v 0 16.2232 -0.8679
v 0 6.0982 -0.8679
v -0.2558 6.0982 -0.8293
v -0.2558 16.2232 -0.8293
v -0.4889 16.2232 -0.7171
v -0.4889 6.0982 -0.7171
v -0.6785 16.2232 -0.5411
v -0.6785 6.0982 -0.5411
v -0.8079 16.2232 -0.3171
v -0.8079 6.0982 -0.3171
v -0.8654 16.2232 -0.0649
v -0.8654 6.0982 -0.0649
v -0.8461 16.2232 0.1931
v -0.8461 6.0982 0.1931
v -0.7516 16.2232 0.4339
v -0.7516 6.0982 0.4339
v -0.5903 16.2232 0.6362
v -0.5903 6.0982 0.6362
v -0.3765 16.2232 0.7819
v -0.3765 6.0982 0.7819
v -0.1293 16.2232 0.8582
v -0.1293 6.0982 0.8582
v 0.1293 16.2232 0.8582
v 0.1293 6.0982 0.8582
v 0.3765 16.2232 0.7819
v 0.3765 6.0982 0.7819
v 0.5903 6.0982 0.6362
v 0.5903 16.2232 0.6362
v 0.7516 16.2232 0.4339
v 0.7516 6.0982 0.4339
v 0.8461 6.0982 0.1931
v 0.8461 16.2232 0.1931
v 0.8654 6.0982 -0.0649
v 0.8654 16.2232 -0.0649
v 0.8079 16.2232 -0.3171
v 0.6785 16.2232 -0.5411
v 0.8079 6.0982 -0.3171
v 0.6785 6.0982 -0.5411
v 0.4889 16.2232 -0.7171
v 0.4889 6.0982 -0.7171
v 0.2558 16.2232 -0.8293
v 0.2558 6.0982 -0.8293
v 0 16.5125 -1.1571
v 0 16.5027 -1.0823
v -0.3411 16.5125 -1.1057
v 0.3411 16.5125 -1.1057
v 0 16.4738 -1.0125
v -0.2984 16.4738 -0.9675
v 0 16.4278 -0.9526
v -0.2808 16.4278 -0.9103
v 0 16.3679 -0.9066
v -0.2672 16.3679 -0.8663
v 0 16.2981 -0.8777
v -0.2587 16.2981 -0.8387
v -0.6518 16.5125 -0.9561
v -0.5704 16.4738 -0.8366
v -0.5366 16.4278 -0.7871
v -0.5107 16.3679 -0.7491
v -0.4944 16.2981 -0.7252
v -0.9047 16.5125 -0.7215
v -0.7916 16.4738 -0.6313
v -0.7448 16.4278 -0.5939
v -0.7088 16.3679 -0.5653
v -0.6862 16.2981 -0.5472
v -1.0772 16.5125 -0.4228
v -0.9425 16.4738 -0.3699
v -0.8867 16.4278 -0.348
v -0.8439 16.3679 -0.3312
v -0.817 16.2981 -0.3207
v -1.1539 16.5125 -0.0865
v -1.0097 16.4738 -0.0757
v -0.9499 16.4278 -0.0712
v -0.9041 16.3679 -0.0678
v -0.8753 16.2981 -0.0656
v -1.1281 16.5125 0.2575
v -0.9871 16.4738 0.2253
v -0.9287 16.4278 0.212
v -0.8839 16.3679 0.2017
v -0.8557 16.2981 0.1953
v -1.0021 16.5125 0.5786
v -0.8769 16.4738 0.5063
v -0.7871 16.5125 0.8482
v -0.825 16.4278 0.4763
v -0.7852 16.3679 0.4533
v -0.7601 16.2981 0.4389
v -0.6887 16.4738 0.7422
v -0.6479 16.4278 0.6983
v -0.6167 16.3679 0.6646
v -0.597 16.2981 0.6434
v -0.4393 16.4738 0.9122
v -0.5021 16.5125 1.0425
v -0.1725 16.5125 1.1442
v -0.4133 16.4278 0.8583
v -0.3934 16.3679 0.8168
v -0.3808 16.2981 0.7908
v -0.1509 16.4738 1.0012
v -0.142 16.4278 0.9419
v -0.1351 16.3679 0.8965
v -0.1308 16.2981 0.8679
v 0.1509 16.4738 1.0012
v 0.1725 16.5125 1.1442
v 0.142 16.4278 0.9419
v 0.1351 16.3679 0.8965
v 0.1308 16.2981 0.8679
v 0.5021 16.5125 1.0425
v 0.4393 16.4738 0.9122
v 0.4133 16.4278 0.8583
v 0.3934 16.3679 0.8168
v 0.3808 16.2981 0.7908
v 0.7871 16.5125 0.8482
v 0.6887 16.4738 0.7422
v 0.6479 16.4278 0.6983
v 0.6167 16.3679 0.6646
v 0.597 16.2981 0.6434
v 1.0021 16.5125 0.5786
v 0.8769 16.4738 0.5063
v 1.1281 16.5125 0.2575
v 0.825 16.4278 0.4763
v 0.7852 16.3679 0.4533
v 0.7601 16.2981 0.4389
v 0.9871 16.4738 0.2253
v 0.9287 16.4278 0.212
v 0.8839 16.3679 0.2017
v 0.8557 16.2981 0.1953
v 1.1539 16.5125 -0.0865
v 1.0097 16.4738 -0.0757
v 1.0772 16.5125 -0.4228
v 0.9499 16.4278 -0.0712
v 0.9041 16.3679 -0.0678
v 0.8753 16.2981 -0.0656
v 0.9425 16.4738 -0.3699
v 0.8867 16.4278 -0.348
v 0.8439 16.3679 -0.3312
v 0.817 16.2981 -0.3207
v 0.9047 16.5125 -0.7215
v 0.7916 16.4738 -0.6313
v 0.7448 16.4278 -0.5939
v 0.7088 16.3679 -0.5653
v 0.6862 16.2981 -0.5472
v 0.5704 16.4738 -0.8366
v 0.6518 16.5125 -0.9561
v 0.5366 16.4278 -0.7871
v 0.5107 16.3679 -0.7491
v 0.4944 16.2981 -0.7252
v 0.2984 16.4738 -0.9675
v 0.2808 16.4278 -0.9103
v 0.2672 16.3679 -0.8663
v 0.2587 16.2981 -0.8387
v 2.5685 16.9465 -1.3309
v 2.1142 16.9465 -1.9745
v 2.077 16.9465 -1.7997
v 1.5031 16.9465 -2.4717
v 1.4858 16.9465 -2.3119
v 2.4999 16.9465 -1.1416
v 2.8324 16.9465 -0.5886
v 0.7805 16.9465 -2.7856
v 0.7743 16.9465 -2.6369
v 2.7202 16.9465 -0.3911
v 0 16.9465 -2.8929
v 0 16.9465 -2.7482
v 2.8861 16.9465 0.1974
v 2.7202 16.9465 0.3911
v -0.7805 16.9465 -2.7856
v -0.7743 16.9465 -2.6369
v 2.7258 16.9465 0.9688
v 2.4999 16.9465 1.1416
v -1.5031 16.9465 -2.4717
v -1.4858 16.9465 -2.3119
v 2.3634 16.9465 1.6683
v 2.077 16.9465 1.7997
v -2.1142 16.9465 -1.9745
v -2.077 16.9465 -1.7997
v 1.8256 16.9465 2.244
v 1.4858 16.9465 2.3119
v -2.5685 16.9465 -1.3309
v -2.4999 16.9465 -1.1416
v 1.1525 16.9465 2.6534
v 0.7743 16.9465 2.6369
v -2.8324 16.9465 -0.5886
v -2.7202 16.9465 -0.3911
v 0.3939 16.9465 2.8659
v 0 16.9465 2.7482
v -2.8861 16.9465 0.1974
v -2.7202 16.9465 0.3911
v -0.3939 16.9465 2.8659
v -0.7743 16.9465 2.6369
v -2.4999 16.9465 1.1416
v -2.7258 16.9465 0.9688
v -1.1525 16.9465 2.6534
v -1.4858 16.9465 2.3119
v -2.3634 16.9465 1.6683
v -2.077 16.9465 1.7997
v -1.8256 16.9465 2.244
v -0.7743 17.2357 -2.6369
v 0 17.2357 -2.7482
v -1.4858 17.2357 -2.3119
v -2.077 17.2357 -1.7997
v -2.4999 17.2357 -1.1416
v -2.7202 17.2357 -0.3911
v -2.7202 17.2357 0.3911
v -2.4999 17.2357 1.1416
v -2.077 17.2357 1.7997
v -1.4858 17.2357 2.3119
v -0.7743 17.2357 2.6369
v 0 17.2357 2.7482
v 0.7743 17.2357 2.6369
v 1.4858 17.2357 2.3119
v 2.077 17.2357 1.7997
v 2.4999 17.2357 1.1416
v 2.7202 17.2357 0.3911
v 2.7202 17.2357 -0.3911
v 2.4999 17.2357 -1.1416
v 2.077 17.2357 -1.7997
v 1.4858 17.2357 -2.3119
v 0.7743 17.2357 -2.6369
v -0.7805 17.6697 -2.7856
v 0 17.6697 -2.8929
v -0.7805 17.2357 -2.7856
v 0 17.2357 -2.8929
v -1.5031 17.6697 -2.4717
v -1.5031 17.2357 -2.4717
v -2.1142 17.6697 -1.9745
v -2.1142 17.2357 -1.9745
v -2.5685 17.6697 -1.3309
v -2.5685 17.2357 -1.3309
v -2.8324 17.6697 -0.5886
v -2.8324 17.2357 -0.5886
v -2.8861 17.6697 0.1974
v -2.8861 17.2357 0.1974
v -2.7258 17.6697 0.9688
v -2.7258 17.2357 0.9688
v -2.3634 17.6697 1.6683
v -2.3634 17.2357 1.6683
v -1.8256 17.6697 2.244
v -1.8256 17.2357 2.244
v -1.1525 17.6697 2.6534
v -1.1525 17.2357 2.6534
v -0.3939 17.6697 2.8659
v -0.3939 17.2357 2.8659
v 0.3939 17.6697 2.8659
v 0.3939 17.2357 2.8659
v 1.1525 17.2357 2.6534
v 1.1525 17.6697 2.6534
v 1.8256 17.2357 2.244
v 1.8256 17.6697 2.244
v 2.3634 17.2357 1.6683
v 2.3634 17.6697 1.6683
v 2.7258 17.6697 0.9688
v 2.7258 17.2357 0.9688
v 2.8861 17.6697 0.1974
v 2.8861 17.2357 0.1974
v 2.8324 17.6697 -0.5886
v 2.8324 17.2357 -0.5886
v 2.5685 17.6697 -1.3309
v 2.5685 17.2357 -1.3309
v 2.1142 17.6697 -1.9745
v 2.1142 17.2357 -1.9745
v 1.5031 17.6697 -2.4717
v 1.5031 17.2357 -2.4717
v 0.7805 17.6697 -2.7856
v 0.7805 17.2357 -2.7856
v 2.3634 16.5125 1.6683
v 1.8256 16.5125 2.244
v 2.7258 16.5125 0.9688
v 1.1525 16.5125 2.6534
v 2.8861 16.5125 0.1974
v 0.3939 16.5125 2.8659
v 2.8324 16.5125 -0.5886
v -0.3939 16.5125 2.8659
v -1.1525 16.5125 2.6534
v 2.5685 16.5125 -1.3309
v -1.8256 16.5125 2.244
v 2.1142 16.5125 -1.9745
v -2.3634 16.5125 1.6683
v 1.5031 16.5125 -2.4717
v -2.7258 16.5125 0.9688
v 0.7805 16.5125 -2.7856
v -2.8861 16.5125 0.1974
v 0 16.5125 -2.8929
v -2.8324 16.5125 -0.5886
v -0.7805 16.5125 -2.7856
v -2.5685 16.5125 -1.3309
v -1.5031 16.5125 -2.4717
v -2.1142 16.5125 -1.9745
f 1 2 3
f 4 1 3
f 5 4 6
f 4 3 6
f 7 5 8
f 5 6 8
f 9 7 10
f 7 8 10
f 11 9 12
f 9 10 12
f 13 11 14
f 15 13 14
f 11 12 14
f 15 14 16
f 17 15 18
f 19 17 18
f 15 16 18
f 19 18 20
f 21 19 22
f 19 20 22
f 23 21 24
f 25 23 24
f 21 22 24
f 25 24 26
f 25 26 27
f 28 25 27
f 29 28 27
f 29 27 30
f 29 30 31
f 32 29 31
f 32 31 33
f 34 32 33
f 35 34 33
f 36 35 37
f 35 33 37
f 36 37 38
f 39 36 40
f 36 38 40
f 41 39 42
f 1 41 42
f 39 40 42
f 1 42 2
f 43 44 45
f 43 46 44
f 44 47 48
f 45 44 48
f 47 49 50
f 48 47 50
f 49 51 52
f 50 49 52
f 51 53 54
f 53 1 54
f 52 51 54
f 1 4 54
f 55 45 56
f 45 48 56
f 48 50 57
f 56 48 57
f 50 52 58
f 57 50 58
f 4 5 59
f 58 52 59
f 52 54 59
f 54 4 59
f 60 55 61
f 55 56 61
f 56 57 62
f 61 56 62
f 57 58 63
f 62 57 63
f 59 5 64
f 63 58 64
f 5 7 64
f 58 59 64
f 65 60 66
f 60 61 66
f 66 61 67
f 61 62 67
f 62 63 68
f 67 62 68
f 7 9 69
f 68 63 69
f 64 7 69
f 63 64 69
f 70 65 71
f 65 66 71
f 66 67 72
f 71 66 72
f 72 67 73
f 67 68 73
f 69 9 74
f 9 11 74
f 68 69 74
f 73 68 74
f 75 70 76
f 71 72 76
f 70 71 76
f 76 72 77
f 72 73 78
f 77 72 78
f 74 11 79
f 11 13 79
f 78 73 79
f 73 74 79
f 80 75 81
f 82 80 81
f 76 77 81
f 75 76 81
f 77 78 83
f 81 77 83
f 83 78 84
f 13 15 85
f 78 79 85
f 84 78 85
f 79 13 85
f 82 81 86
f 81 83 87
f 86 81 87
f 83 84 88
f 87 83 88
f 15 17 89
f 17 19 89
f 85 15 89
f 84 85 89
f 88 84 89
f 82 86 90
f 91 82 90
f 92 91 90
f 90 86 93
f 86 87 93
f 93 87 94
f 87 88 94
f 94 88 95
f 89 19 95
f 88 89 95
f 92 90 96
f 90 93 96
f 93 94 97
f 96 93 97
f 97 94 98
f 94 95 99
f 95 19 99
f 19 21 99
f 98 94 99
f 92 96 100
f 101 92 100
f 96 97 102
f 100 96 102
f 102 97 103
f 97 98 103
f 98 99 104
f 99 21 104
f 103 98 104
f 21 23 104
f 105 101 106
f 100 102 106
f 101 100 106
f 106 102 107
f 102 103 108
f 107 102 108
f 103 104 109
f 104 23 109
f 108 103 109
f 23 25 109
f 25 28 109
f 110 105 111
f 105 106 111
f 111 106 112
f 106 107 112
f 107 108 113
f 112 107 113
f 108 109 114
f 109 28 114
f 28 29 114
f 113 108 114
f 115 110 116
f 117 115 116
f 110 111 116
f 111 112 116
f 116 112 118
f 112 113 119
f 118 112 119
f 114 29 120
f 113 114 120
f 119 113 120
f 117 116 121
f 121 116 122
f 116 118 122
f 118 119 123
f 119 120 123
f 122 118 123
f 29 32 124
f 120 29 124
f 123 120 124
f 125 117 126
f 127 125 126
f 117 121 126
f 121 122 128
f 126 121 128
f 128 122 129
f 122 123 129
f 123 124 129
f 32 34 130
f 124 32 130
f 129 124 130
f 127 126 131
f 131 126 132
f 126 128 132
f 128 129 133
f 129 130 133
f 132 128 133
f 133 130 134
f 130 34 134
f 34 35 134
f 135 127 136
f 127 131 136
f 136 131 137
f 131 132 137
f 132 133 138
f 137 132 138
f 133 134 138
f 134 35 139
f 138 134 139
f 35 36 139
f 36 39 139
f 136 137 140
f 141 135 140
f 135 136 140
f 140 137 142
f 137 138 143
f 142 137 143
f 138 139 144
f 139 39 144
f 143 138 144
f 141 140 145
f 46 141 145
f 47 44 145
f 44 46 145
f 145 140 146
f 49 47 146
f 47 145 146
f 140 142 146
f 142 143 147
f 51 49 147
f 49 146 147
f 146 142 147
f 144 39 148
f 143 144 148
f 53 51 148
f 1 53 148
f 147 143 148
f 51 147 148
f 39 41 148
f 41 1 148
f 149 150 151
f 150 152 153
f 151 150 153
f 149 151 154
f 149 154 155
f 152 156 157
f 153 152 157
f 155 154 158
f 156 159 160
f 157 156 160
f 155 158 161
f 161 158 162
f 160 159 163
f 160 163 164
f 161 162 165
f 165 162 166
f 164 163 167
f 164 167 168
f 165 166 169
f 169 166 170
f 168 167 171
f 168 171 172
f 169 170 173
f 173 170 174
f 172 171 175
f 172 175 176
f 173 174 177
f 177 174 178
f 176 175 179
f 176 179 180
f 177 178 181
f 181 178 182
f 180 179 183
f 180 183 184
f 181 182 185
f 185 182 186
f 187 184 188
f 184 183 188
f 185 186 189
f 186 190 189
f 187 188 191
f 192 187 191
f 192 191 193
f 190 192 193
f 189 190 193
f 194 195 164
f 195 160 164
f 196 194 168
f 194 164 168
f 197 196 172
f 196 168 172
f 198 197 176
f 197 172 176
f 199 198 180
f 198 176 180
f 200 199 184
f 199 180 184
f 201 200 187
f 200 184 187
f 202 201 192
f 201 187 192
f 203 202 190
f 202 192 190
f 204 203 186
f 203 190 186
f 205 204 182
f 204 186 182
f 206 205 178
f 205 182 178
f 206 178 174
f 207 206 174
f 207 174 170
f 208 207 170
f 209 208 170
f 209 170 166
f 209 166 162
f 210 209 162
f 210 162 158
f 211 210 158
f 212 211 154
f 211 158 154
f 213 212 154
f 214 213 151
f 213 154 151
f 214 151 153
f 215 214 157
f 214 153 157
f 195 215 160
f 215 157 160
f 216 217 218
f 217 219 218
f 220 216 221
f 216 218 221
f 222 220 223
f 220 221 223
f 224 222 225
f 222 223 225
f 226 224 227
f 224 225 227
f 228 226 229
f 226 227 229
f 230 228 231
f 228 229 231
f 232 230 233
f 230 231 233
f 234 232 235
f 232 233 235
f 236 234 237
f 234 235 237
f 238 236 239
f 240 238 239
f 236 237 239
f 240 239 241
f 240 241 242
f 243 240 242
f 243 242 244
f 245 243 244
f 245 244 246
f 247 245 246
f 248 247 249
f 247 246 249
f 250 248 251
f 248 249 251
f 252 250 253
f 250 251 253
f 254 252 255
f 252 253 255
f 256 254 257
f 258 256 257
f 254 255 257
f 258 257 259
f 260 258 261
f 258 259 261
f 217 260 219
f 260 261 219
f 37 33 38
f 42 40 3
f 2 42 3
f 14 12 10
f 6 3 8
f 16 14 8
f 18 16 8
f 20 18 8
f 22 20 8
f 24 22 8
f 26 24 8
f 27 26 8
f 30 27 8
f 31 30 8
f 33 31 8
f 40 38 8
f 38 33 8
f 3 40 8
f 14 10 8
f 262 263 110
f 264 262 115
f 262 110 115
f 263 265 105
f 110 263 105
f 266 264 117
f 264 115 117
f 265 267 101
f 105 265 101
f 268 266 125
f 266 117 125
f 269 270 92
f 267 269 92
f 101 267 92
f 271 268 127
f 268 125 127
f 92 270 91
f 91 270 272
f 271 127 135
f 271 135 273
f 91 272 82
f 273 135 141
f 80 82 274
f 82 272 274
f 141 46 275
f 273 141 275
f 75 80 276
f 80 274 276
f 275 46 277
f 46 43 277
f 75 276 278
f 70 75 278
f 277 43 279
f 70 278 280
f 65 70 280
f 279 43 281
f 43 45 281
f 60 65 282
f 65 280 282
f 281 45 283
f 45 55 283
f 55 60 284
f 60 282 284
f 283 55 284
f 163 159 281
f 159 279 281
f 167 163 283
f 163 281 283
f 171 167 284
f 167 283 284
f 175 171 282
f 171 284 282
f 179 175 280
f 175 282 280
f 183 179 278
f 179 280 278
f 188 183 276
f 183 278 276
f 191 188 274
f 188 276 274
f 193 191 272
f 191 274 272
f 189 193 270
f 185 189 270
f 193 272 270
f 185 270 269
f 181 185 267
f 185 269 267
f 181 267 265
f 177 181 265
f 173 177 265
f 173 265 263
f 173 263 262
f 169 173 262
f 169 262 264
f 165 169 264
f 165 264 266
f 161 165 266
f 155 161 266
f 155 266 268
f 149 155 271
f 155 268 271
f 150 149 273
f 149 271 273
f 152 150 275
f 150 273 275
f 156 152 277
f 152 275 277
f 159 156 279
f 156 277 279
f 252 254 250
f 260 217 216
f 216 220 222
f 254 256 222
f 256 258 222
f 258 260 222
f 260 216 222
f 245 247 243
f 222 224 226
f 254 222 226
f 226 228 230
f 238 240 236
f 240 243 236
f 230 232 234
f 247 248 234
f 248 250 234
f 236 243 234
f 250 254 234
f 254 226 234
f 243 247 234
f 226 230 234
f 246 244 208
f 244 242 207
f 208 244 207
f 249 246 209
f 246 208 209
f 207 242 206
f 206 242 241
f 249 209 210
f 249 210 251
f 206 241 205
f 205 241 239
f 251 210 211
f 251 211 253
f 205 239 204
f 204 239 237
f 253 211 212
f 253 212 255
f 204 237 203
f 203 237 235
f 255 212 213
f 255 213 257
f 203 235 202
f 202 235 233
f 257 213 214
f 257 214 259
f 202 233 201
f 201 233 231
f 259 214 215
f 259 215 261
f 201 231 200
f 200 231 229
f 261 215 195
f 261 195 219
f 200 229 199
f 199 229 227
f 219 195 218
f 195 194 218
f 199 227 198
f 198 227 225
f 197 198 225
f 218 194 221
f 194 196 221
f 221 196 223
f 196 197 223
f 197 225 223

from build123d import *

# Parameters (mm, degrees)
CONG_1_R       = 0.5
ECHELLE1_SCALE = 0.578571429


with BuildPart() as part:
    # Esquisse1 → Révolution1 (revolve)
    with BuildSketch(Plane.XY, mode=Mode.PRIVATE) as r_volution1_sk:
        Polygon((0, 20), (5, 20), (5, 19.25), (4.75, 19.25), (4.75, 18.75), (5, 18.75), (5, 18), (1.5, 18), (1.5, 0), (0, 0), align=None)
    revolve(r_volution1_sk.sketch.rotate(Axis((0, 0, 0), (0, 1, 0)), 90), axis=Axis((0, 0, 0), (0, 1, 0)))

    # Congé1
    cong_1_edges = [part.edges().sort_by_distance(p)[0] for p in [
        (0, 18, 1.5),
    ]]
    fillet(cong_1_edges, radius=CONG_1_R)


with BuildPart() as part_1:
    # Echelle1: scaled about (0, 14.470399807, 0)
    add(part.part.scale(ECHELLE1_SCALE).moved(Location((0, 6.098239919, 0))))


solid = part_1.part
